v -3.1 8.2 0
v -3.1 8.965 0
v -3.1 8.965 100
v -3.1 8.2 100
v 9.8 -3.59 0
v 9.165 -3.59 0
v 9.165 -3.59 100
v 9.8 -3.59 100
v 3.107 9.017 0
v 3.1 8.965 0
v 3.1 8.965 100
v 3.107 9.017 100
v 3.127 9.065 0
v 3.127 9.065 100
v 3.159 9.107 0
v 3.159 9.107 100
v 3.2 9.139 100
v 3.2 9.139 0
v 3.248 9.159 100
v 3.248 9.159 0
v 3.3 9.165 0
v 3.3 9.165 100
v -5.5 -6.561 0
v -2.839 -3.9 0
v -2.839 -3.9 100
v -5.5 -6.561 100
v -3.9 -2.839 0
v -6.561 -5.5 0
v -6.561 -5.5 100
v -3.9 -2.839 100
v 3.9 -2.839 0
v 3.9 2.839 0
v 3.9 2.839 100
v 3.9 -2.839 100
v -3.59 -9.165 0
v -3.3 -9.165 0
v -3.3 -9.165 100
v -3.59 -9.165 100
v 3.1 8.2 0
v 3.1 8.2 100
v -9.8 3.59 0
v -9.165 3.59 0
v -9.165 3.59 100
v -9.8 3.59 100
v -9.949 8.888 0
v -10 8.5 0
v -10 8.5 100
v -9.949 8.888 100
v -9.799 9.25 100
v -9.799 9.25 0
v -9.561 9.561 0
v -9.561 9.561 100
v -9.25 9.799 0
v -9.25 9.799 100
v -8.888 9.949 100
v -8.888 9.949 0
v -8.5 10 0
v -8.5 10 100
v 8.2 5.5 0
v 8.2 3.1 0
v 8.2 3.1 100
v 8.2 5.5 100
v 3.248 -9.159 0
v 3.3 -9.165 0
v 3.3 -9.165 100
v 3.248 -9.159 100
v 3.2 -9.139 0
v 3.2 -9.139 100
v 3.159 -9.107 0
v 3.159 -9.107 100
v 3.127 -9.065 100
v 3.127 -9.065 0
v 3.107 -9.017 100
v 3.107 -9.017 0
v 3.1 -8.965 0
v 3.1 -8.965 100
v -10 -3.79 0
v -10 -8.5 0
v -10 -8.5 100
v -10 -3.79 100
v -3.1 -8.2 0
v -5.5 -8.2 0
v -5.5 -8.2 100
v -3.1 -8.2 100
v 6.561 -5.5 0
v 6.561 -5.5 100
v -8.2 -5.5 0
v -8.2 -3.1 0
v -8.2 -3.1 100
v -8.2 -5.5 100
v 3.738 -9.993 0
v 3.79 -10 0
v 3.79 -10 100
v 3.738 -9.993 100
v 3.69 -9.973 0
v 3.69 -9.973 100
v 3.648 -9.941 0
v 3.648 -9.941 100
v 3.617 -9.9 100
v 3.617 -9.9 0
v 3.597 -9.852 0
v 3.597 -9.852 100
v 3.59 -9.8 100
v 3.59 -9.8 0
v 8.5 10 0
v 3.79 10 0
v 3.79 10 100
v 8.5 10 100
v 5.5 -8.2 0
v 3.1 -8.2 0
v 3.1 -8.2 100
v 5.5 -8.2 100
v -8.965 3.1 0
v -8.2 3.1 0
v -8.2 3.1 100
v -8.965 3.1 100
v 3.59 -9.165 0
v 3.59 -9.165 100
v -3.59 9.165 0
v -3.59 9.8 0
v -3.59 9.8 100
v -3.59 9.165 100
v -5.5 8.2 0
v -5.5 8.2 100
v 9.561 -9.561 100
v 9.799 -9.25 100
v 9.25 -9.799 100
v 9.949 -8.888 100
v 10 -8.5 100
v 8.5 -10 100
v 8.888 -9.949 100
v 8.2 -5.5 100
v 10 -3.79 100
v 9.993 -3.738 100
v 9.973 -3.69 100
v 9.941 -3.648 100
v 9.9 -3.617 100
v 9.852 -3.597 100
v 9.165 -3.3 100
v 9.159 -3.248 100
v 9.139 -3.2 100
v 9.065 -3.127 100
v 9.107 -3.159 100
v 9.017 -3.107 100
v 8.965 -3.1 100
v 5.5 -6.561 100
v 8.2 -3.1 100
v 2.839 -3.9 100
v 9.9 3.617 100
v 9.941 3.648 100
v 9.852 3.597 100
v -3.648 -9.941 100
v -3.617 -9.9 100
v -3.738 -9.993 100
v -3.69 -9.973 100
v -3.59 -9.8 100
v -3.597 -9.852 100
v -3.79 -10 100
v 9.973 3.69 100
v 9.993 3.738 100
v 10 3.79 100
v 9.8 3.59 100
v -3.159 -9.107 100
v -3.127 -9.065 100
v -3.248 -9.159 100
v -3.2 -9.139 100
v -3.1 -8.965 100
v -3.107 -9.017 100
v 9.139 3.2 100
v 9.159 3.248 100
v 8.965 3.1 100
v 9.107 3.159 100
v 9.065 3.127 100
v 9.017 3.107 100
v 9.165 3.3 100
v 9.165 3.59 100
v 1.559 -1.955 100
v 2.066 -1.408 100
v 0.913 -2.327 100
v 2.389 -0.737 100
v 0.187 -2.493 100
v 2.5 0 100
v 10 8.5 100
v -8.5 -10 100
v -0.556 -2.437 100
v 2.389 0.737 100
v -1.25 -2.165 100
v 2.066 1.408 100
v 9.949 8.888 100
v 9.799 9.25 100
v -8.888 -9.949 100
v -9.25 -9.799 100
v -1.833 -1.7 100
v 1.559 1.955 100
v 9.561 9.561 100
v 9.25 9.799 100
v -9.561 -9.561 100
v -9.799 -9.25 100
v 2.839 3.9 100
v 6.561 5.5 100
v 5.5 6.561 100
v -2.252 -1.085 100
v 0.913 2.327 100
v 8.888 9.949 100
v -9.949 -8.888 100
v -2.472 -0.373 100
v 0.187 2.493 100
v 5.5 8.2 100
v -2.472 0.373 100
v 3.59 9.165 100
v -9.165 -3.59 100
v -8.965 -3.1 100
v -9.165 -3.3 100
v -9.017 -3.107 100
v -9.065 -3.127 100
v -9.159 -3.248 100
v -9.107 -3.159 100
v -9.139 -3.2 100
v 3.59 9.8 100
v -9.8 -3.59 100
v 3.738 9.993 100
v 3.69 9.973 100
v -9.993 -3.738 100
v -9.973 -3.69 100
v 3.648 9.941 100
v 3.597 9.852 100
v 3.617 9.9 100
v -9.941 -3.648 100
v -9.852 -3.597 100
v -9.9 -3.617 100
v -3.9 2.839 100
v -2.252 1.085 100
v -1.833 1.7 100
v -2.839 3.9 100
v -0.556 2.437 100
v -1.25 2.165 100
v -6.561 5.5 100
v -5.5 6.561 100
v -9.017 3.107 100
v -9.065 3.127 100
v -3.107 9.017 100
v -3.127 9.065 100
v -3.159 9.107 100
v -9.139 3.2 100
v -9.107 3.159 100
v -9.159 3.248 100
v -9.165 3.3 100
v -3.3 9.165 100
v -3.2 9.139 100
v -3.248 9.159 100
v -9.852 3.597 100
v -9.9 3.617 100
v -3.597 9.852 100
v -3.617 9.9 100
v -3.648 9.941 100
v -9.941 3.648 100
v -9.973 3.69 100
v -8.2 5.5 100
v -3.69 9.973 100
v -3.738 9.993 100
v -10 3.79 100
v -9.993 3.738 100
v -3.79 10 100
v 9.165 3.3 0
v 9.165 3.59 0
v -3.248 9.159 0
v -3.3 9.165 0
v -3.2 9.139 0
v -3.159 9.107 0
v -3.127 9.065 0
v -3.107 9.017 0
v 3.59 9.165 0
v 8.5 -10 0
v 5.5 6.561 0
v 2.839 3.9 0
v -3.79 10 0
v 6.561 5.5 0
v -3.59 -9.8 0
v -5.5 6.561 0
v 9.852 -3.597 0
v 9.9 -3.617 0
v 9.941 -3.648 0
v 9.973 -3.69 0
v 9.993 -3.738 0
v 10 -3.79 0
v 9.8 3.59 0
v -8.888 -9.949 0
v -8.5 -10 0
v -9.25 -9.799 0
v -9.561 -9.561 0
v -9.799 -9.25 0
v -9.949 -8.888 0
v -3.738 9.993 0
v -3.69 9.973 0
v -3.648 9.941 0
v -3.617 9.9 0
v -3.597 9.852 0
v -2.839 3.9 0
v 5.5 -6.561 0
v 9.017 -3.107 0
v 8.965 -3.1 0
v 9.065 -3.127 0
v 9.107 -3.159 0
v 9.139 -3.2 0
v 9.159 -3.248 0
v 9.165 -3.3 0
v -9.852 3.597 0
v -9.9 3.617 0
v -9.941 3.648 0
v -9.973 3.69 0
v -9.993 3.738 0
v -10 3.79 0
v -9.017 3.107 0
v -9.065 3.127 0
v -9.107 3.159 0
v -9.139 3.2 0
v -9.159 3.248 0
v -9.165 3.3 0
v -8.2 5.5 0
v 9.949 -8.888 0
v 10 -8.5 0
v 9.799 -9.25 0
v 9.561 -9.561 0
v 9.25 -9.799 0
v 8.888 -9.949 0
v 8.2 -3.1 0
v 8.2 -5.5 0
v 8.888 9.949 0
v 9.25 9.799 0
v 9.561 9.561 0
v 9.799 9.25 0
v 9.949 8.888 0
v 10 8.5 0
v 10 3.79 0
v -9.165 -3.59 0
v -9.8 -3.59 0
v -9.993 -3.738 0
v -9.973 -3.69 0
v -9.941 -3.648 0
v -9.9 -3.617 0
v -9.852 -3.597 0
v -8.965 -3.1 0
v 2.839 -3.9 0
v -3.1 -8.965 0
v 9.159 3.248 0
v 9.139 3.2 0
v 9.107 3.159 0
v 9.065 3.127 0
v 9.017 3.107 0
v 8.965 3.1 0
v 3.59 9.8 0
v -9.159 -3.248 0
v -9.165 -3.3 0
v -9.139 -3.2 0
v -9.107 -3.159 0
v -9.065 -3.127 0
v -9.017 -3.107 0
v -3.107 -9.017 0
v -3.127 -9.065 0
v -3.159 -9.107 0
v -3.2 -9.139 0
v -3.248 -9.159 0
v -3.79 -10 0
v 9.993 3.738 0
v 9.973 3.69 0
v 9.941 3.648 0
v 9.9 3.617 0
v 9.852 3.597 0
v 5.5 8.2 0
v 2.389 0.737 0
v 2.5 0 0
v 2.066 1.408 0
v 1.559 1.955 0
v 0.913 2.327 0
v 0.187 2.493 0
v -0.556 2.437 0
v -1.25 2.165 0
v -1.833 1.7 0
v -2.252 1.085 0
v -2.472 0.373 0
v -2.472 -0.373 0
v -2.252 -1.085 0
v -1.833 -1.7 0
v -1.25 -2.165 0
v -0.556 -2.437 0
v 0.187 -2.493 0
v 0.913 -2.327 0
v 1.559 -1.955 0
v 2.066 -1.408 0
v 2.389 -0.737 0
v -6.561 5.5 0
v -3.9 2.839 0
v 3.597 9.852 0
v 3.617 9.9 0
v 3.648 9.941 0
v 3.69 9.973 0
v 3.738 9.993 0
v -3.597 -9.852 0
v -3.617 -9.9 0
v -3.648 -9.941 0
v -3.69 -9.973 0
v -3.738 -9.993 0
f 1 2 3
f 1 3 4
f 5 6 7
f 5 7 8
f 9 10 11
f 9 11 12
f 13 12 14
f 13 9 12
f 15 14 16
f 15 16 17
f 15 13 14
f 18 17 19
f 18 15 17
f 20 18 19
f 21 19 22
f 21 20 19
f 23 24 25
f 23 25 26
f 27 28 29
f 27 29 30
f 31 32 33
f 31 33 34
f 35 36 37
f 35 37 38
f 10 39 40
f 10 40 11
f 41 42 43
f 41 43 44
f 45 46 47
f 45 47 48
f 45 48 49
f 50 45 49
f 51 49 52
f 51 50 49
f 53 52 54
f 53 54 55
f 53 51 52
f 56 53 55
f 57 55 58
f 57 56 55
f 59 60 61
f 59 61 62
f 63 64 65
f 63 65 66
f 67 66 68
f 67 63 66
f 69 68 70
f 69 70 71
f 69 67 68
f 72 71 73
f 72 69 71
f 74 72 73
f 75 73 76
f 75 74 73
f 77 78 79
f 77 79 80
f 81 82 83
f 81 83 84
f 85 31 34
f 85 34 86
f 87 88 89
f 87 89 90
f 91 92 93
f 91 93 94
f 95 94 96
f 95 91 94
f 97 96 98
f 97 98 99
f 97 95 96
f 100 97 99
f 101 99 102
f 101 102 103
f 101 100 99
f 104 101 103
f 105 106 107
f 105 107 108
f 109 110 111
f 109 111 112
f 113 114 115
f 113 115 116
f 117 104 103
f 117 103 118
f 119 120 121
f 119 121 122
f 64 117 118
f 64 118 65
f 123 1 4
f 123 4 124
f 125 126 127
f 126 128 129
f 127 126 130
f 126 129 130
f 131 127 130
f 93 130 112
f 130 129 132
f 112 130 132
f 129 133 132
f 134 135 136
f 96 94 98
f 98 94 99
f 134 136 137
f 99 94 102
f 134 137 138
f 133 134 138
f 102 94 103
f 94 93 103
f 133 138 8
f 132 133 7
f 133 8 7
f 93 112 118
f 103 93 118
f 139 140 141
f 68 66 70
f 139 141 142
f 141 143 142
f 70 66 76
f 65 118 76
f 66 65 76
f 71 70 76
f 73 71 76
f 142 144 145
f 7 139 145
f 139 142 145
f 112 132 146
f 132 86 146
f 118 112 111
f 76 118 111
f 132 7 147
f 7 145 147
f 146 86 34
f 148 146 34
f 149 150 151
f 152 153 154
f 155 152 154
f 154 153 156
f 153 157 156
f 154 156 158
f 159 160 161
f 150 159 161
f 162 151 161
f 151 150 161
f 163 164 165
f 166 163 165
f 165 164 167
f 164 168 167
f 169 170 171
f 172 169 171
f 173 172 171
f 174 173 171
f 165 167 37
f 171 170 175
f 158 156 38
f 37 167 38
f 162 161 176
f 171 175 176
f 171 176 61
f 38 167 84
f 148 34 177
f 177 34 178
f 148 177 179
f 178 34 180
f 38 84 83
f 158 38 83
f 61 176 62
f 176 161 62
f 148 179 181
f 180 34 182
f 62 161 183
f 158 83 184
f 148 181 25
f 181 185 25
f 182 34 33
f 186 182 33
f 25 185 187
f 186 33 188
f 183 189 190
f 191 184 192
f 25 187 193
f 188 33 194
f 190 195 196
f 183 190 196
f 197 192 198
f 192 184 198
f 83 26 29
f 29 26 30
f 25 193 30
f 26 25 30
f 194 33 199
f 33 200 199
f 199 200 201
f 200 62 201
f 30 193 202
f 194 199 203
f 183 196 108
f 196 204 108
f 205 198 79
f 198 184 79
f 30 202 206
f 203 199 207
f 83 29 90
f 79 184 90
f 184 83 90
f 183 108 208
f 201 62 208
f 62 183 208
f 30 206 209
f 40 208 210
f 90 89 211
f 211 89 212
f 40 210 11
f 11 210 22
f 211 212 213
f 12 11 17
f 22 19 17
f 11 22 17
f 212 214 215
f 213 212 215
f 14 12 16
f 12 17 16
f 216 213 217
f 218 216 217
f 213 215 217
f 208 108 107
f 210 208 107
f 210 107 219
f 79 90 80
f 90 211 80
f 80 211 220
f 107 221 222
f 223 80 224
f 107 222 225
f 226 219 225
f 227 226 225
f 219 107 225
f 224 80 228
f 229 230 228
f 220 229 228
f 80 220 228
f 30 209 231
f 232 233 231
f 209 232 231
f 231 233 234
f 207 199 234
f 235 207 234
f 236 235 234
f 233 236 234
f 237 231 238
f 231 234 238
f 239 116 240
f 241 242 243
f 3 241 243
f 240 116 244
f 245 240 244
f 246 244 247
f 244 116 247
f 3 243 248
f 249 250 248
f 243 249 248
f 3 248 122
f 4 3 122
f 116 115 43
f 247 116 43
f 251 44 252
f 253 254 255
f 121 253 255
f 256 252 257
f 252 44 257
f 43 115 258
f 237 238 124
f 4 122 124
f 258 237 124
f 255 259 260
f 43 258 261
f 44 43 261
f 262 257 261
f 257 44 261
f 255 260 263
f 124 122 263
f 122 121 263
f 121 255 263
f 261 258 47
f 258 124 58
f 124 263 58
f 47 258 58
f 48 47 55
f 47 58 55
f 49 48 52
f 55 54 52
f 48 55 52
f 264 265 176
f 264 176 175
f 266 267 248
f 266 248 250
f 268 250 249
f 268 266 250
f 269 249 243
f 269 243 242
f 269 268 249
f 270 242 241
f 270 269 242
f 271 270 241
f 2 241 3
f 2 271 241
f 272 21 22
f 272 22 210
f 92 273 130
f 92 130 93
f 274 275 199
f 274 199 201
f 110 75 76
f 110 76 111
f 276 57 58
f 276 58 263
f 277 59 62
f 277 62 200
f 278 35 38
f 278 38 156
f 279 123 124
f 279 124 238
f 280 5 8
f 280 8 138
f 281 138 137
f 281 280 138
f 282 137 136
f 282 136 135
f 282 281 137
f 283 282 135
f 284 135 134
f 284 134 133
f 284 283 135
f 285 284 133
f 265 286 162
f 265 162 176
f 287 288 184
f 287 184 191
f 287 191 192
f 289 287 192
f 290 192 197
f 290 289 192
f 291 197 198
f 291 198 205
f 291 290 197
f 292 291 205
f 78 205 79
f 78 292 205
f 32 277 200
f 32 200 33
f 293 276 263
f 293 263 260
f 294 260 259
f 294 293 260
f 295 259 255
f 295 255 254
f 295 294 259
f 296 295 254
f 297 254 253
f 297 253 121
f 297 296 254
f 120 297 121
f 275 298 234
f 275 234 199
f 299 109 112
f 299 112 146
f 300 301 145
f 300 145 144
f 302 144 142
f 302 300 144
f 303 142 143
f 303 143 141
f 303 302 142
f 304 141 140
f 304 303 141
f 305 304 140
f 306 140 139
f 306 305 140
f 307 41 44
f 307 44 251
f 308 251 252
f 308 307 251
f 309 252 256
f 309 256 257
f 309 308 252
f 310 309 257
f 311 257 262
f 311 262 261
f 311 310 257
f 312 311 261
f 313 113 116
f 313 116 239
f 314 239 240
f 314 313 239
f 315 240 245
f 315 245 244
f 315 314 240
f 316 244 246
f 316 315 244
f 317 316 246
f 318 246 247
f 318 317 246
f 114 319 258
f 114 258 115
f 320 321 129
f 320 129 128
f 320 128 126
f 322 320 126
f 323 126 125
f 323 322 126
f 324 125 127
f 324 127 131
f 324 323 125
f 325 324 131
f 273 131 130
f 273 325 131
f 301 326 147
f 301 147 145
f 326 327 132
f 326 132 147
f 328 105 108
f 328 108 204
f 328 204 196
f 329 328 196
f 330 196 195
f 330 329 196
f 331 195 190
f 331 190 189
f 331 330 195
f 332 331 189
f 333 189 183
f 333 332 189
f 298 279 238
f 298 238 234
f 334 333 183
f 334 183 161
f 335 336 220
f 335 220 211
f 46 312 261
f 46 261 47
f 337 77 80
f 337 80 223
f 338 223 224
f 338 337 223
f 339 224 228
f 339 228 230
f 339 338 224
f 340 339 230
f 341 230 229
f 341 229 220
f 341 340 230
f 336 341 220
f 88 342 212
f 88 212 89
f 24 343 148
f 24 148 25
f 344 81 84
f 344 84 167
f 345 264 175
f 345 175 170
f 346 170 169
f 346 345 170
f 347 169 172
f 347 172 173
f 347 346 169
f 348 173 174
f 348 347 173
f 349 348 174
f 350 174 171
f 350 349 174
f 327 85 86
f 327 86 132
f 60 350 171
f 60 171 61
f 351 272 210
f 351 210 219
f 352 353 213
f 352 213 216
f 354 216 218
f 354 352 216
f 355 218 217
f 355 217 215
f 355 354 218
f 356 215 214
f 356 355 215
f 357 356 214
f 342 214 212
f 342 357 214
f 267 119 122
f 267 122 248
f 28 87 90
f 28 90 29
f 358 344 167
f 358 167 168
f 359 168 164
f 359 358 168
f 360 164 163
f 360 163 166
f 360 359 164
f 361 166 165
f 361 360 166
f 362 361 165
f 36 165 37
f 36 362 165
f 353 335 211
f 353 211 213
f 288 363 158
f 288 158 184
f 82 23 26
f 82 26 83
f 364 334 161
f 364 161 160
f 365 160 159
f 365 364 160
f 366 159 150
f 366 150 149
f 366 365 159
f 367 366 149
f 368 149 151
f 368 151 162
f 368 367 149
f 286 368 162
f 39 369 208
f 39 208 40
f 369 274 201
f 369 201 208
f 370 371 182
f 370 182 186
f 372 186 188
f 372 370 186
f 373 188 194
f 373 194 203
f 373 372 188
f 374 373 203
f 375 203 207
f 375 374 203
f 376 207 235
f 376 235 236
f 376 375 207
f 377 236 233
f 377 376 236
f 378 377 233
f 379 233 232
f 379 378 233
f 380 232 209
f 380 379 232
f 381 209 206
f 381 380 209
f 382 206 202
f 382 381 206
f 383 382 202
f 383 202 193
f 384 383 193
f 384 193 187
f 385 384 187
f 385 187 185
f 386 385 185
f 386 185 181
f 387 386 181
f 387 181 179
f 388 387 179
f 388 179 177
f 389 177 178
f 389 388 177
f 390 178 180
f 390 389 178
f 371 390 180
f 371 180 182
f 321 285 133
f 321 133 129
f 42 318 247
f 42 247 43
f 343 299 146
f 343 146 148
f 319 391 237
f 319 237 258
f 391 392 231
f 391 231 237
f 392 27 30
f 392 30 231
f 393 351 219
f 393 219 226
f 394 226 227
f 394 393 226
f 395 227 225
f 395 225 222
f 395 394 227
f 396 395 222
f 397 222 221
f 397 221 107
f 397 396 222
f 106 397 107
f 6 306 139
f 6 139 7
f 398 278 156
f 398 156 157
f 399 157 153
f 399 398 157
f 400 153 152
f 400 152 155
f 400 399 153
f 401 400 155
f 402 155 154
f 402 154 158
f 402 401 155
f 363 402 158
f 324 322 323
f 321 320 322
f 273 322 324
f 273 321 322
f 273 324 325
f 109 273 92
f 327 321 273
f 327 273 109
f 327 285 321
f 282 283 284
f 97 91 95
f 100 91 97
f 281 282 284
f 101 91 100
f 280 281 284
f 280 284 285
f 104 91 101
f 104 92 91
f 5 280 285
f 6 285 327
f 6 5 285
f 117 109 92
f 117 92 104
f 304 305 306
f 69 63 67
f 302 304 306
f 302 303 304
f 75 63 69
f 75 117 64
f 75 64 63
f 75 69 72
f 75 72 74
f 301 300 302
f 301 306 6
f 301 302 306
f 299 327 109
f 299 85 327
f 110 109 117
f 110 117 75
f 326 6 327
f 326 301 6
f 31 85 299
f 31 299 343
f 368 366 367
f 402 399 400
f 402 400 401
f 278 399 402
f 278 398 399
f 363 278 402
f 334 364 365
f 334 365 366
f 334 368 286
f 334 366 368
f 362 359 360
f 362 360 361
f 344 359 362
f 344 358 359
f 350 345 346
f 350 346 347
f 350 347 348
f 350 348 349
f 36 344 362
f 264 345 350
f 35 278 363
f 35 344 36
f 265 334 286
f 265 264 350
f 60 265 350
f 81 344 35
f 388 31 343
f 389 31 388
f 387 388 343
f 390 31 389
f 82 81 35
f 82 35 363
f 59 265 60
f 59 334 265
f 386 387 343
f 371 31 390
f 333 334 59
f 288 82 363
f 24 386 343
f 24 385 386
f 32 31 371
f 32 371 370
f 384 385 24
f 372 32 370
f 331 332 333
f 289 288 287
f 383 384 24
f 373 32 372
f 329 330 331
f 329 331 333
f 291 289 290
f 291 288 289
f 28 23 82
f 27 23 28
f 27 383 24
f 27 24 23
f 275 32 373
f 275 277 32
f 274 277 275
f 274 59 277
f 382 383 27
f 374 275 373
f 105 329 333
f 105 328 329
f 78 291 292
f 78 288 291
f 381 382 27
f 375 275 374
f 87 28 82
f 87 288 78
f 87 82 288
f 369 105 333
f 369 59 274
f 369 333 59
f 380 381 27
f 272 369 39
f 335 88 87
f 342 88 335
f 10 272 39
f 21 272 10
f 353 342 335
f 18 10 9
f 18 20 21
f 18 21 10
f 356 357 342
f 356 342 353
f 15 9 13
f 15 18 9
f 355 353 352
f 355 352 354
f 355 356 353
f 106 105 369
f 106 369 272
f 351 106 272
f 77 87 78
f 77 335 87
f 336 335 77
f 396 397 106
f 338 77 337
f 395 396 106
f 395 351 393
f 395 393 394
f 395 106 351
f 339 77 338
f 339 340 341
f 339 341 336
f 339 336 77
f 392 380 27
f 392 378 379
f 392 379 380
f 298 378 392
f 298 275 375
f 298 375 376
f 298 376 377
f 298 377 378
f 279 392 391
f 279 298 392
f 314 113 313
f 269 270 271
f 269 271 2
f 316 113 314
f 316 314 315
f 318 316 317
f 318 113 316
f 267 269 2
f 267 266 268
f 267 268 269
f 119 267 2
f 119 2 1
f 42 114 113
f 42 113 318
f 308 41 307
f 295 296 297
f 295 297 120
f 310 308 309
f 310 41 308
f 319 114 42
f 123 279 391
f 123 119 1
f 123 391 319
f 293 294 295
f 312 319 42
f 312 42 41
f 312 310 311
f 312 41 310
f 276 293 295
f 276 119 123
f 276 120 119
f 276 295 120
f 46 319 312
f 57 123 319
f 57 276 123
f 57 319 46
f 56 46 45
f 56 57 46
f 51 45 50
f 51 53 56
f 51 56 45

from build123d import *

# Parameters (mm, degrees)
SKETCH_1_R      = 2.5
EXTRUDE_1_DEPTH = 100


with BuildPart() as part:
    # 草图1 → 凸台-拉伸1 (new body)
    with BuildSketch(Plane.XY):
        with BuildLine():
            Line((2.839339828, 3.9), (5.5, 6.560660172))
            Line((5.5, 6.560660172), (5.5, 8.2))
            Line((5.5, 8.2), (3.1, 8.2))
            Line((3.1, 8.2), (3.1, 8.965473865))
            ThreePointArc((3.1, 8.965473865), (3.158578644, 9.106895221), (3.3, 9.165473865))
            Line((3.3, 9.165473865), (3.589843476, 9.165473865))
            Line((3.589843476, 9.165473865), (3.589843476, 9.8))
            ThreePointArc((3.589843476, 9.8), (3.64842212, 9.941421356), (3.789843476, 10))
            Line((3.789843476, 10), (8.5, 10))
            ThreePointArc((8.5, 10), (9.560660172, 9.560660172), (10, 8.5))
            Line((10, 8.5), (10, 3.789843476))
            ThreePointArc((10, 3.789843476), (9.941421356, 3.64842212), (9.8, 3.589843476))
            Line((9.8, 3.589843476), (9.165473865, 3.589843476))
            Line((9.165473865, 3.589843476), (9.165473865, 3.3))
            ThreePointArc((9.165473865, 3.3), (9.106895221, 3.158578644), (8.965473865, 3.1))
            Line((8.965473865, 3.1), (8.2, 3.1))
            Line((8.2, 3.1), (8.2, 5.5))
            Line((8.2, 5.5), (6.560660172, 5.5))
            Line((6.560660172, 5.5), (3.9, 2.839339828))
            Line((3.9, 2.839339828), (3.9, -2.839339828))
            Line((3.9, -2.839339828), (6.560660172, -5.5))
            Line((6.560660172, -5.5), (8.2, -5.5))
            Line((8.2, -5.5), (8.2, -3.1))
            Line((8.2, -3.1), (8.965473865, -3.1))
            ThreePointArc((8.965473865, -3.1), (9.106895221, -3.158578644), (9.165473865, -3.3))
            Line((9.165473865, -3.3), (9.165473865, -3.589843476))
            Line((9.165473865, -3.589843476), (9.8, -3.589843476))
            ThreePointArc((9.8, -3.589843476), (9.941421356, -3.64842212), (10, -3.789843476))
            Line((10, -3.789843476), (10, -8.5))
            ThreePointArc((10, -8.5), (9.560660172, -9.560660172), (8.5, -10))
            Line((8.5, -10), (3.789843476, -10))
            ThreePointArc((3.789843476, -10), (3.64842212, -9.941421356), (3.589843476, -9.8))
            Line((3.589843476, -9.8), (3.589843476, -9.165473865))
            Line((3.589843476, -9.165473865), (3.3, -9.165473865))
            ThreePointArc((3.3, -9.165473865), (3.158578644, -9.106895221), (3.1, -8.965473865))
            Line((3.1, -8.965473865), (3.1, -8.2))
            Line((3.1, -8.2), (5.5, -8.2))
            Line((5.5, -8.2), (5.5, -6.560660172))
            Line((5.5, -6.560660172), (2.839339828, -3.9))
            Line((2.839339828, -3.9), (-2.839339828, -3.9))
            Line((-2.839339828, -3.9), (-5.5, -6.560660172))
            Line((-5.5, -6.560660172), (-5.5, -8.2))
            Line((-5.5, -8.2), (-3.1, -8.2))
            Line((-3.1, -8.2), (-3.1, -8.965473865))
            ThreePointArc((-3.1, -8.965473865), (-3.158578644, -9.106895221), (-3.3, -9.165473865))
            Line((-3.3, -9.165473865), (-3.589843476, -9.165473865))
            Line((-3.589843476, -9.165473865), (-3.589843476, -9.8))
            ThreePointArc((-3.589843476, -9.8), (-3.64842212, -9.941421356), (-3.789843476, -10))
            Line((-3.789843476, -10), (-8.5, -10))
            ThreePointArc((-8.5, -10), (-9.560660172, -9.560660172), (-10, -8.5))
            Line((-10, -8.5), (-10, -3.789843476))
            ThreePointArc((-10, -3.789843476), (-9.941421356, -3.64842212), (-9.8, -3.589843476))
            Line((-9.8, -3.589843476), (-9.165473865, -3.589843476))
            Line((-9.165473865, -3.589843476), (-9.165473865, -3.3))
            ThreePointArc((-9.165473865, -3.3), (-9.106895221, -3.158578644), (-8.965473865, -3.1))
            Line((-8.965473865, -3.1), (-8.2, -3.1))
            Line((-8.2, -3.1), (-8.2, -5.5))
            Line((-8.2, -5.5), (-6.560660172, -5.5))
            Line((-6.560660172, -5.5), (-3.9, -2.839339828))
            Line((-3.9, -2.839339828), (-3.9, 2.839339828))
            Line((-3.9, 2.839339828), (-6.560660172, 5.5))
            Line((-6.560660172, 5.5), (-8.2, 5.5))
            Line((-8.2, 5.5), (-8.2, 3.1))
            Line((-8.2, 3.1), (-8.965473865, 3.1))
            ThreePointArc((-8.965473865, 3.1), (-9.106895221, 3.158578644), (-9.165473865, 3.3))
            Line((-9.165473865, 3.3), (-9.165473865, 3.589843476))
            Line((-9.165473865, 3.589843476), (-9.8, 3.589843476))
            ThreePointArc((-9.8, 3.589843476), (-9.941421356, 3.64842212), (-10, 3.789843476))
            Line((-10, 3.789843476), (-10, 8.5))
            ThreePointArc((-10, 8.5), (-9.560660172, 9.560660172), (-8.5, 10))
            Line((-8.5, 10), (-3.789843476, 10))
            ThreePointArc((-3.789843476, 10), (-3.64842212, 9.941421356), (-3.589843476, 9.8))
            Line((-3.589843476, 9.8), (-3.589843476, 9.165473865))
            Line((-3.589843476, 9.165473865), (-3.3, 9.165473865))
            ThreePointArc((-3.3, 9.165473865), (-3.158578644, 9.106895221), (-3.1, 8.965473865))
            Line((-3.1, 8.965473865), (-3.1, 8.2))
            Line((-3.1, 8.2), (-5.5, 8.2))
            Line((-5.5, 8.2), (-5.5, 6.560660172))
            Line((-5.5, 6.560660172), (-2.839339828, 3.9))
            Line((-2.839339828, 3.9), (2.839339828, 3.9))
        make_face()
        Circle(SKETCH_1_R, mode=Mode.SUBTRACT)
    extrude(amount=EXTRUDE_1_DEPTH)


solid = part.part
